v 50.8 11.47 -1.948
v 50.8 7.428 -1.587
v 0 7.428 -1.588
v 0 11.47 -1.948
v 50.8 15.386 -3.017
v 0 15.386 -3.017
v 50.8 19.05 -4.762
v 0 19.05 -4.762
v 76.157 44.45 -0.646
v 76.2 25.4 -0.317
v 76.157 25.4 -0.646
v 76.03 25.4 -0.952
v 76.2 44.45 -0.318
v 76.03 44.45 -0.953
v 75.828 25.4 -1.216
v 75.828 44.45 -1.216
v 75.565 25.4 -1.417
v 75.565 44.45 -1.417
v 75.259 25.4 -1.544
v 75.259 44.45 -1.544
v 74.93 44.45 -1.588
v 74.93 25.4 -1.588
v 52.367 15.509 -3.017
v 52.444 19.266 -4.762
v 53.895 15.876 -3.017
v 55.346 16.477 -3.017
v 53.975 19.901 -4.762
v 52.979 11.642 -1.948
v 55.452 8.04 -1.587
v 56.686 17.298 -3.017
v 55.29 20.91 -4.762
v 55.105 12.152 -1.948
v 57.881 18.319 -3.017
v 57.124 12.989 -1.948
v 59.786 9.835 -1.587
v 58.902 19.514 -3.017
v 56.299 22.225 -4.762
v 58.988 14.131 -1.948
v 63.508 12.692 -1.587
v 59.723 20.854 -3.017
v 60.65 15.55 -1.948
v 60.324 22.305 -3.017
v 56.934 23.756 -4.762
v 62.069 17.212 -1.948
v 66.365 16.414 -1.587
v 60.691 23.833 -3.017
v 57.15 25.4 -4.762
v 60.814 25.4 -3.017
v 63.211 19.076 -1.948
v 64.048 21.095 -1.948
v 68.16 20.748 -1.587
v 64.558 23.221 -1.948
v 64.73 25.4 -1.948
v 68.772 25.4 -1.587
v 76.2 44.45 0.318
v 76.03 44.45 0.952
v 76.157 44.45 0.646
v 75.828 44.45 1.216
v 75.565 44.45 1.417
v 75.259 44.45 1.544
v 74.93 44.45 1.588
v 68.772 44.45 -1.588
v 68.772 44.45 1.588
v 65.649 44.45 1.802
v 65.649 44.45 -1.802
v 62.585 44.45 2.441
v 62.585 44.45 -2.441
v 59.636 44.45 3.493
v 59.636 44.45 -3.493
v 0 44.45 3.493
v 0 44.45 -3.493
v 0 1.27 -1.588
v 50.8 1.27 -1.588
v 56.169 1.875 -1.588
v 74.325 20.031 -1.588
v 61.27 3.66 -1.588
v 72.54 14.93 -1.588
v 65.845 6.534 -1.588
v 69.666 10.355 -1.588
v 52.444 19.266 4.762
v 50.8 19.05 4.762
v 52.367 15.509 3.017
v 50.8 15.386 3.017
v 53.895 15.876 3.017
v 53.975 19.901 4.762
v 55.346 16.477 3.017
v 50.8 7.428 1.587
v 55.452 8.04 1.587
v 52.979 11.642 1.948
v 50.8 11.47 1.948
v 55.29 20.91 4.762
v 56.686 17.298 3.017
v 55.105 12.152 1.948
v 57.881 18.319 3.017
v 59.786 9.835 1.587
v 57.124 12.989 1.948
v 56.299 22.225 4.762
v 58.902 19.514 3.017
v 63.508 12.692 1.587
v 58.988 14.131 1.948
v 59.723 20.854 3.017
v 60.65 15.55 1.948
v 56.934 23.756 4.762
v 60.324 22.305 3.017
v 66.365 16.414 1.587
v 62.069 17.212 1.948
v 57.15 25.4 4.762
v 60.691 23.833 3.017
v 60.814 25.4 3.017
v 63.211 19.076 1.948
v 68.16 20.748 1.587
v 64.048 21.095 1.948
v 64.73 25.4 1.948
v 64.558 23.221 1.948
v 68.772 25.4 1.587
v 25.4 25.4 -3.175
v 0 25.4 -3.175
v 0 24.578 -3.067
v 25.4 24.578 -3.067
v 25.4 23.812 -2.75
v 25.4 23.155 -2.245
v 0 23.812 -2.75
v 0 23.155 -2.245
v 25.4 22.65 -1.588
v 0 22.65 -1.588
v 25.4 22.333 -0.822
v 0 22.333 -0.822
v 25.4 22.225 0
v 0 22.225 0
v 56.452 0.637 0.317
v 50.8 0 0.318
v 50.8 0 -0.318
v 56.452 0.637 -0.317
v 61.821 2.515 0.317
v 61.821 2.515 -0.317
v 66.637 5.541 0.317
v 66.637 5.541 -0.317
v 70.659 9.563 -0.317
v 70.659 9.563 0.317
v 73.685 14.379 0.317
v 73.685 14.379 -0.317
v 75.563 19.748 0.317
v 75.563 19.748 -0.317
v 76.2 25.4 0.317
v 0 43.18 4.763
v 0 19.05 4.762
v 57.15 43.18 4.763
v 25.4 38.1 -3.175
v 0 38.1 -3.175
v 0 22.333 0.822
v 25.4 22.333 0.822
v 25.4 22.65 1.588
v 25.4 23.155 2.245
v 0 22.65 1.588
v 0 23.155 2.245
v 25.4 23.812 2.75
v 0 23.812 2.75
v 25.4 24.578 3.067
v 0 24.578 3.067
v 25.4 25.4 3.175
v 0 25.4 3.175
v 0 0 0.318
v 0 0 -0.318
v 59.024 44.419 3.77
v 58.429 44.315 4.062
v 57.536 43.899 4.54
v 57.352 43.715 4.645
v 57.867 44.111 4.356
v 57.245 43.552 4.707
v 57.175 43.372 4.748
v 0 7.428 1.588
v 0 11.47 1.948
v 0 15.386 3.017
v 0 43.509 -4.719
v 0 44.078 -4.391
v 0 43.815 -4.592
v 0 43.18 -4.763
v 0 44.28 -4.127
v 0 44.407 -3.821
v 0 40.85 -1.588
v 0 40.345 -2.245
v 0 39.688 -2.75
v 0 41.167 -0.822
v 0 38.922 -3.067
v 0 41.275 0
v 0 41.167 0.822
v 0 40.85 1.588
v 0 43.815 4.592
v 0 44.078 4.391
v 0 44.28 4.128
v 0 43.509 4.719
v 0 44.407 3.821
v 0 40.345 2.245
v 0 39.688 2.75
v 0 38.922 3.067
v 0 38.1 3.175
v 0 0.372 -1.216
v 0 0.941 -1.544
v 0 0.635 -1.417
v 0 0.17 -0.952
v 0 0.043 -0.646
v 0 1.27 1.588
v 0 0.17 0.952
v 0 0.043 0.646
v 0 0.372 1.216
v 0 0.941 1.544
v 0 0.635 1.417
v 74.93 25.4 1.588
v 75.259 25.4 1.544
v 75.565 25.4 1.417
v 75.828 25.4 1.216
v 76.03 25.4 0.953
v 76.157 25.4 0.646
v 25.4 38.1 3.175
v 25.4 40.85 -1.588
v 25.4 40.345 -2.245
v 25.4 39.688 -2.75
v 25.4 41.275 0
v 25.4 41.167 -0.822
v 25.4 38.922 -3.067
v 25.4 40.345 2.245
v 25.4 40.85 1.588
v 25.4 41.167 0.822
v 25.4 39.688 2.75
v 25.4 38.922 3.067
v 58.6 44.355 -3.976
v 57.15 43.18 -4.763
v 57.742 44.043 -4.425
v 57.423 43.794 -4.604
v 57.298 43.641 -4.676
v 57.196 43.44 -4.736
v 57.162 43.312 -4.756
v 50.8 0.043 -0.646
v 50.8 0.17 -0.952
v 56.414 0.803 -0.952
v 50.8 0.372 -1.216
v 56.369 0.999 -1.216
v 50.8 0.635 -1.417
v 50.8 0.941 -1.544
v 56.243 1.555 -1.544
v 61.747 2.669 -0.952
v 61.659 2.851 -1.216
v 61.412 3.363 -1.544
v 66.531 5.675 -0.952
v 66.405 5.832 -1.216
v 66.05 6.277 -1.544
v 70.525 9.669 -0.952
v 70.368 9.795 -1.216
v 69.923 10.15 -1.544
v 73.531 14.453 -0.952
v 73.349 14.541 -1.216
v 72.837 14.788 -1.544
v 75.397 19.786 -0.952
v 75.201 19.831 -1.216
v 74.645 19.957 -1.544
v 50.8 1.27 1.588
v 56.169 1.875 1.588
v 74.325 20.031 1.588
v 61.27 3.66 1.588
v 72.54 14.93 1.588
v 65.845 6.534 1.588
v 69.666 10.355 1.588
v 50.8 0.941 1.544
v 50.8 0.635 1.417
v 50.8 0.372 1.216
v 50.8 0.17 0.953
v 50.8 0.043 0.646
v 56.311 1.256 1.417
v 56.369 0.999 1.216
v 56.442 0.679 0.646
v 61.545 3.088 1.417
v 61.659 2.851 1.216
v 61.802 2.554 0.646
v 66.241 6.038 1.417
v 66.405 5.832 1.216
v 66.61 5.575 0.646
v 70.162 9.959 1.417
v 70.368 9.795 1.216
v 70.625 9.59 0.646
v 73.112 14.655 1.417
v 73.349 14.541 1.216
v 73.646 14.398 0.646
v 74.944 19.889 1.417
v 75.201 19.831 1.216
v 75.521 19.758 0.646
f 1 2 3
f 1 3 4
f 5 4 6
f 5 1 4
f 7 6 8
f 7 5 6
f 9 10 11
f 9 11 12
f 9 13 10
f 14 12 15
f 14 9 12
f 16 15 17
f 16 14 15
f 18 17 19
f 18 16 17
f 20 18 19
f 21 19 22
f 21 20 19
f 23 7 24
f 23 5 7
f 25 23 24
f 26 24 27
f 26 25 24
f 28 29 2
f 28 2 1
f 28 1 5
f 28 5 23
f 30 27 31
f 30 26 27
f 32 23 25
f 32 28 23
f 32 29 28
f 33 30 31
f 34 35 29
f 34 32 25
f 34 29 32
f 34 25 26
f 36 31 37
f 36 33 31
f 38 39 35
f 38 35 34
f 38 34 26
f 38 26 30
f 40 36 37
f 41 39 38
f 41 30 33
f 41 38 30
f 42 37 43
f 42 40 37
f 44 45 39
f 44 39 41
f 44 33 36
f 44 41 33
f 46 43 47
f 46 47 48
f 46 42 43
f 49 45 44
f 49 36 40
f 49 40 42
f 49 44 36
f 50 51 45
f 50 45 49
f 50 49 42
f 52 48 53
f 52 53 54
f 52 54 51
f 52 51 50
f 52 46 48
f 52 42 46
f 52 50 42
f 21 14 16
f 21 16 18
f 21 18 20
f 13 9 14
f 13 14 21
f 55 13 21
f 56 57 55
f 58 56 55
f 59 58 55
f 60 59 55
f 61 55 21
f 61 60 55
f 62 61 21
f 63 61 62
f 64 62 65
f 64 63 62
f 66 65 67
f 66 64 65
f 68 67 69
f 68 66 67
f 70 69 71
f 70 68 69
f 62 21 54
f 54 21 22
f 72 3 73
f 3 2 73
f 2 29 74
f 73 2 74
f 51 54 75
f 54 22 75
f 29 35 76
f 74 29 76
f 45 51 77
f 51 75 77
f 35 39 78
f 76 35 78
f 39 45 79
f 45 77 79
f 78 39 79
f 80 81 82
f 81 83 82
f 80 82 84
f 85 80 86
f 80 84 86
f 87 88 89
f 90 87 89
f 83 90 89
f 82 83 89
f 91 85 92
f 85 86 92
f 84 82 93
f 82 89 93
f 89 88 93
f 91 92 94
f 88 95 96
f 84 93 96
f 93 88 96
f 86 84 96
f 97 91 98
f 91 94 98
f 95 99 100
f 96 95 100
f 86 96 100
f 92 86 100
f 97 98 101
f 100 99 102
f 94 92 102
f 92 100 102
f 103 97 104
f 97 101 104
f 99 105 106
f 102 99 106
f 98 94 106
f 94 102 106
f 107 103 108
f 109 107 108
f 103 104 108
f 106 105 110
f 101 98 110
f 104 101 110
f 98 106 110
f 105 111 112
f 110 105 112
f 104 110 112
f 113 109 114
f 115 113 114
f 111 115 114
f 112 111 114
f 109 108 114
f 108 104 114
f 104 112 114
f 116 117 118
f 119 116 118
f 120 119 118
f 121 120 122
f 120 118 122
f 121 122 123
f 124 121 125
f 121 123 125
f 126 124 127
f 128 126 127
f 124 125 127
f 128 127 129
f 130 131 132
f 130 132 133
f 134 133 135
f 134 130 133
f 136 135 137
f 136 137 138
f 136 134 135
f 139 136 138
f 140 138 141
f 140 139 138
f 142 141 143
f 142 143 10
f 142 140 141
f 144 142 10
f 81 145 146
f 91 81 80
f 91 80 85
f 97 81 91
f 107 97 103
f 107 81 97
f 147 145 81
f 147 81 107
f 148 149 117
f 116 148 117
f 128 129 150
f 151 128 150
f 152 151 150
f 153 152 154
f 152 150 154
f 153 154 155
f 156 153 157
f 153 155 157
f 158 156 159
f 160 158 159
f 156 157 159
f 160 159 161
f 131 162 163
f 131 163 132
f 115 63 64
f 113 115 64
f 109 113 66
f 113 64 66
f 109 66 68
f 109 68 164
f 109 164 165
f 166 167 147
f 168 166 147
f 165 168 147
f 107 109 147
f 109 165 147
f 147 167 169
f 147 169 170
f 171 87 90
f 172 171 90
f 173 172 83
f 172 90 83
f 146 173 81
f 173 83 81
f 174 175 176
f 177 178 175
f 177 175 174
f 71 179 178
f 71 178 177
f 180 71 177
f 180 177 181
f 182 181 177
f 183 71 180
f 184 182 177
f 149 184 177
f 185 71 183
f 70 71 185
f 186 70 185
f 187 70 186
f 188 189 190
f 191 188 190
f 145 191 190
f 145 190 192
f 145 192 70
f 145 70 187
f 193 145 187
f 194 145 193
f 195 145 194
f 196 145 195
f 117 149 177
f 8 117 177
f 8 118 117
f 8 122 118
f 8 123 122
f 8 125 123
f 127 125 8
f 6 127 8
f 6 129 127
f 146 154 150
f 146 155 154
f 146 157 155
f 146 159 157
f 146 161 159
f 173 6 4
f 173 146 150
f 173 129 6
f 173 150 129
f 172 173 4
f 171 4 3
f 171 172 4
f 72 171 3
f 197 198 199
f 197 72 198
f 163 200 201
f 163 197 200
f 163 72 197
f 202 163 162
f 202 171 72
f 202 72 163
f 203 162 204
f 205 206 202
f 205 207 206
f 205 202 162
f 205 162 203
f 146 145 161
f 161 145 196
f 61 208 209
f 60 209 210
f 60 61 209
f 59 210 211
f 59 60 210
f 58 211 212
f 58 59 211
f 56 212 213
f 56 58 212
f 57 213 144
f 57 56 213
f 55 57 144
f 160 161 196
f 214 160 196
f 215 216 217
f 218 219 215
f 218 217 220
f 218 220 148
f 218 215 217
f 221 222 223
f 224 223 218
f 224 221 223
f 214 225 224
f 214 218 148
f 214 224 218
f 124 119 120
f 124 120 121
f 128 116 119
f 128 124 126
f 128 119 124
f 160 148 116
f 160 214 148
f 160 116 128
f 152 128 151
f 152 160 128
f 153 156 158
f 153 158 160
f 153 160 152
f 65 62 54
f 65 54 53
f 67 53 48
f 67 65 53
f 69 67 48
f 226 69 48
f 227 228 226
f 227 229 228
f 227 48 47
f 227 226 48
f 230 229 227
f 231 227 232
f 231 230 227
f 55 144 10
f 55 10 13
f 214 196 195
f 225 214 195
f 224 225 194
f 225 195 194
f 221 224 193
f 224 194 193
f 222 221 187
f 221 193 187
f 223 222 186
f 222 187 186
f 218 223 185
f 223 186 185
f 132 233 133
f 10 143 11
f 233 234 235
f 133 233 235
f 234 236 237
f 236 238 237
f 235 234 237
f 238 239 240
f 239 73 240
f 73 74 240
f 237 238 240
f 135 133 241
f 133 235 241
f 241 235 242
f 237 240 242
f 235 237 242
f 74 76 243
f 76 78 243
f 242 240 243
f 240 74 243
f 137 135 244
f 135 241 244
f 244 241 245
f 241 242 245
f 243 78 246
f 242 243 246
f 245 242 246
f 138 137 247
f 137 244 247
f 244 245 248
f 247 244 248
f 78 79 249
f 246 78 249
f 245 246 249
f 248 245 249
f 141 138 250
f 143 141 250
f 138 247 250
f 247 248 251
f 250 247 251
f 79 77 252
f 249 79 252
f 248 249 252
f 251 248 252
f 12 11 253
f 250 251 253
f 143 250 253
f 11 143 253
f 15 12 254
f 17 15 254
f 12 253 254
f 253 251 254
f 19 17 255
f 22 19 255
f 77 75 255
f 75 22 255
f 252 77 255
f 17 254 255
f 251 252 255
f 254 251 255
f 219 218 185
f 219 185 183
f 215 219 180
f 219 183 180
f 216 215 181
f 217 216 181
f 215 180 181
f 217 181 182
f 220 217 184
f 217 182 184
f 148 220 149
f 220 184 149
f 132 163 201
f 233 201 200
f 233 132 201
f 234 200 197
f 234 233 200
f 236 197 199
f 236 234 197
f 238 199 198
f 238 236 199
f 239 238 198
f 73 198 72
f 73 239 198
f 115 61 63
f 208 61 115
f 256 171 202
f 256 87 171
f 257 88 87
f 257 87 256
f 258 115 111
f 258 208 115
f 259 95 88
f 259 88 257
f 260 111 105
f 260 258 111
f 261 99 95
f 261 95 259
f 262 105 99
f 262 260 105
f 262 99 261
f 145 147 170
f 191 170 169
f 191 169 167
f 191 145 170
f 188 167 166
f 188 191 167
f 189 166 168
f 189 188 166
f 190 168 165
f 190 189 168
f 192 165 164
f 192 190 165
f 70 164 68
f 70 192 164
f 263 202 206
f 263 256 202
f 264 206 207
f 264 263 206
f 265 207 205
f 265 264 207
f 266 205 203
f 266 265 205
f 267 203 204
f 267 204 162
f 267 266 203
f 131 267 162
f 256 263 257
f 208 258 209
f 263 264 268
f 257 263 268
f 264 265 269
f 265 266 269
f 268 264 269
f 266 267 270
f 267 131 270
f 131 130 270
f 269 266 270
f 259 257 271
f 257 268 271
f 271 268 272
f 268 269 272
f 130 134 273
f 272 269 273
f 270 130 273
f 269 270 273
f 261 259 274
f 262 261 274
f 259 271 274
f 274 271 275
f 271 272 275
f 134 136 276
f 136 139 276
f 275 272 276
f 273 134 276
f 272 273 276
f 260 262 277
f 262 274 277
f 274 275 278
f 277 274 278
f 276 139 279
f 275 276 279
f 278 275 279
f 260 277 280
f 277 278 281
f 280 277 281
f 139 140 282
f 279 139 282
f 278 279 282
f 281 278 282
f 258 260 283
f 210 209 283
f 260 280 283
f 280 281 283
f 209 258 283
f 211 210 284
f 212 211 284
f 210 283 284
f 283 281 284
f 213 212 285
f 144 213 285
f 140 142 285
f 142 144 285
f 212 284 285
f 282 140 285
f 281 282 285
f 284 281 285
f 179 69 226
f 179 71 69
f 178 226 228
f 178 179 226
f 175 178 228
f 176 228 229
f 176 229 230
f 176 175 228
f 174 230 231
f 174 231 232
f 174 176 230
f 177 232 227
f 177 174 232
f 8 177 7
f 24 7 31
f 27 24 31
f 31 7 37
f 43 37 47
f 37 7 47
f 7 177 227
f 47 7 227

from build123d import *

# Parameters (mm, degrees)
F1_DEPTH = 4.7625
F8_DEPTH = 25.4
F9_R     = 1.27


with BuildPart() as f1:
    # F0 (on Top) → F1 (new body, symmetric)
    with BuildSketch(Plane.XY):
        with BuildLine():
            Line((0, 44.45), (0, 0))
            Line((0, 0), (50.8, 0))
            ThreePointArc((50.8, 0), (68.7605122421, 7.4394877579), (76.2, 25.4))
            Line((76.2, 25.4), (76.2, 44.45))
            Line((76.2, 44.45), (0, 44.45))
        make_face()
    extrude(amount=F1_DEPTH, both=True)


with BuildPart() as f4:
    # F4: sweep along a path in F3
    with BuildLine(Plane.XY.offset(4.7625)) as f4_path:
        Line((0, 0), (50.8, 0))
        ThreePointArc((50.8, 0), (68.7605122421, 7.4394877579), (76.2, 25.4))
        Line((76.2, 25.4), (76.2, 44.45))
    # F2 (on face) → F4 (sweep)
    with BuildSketch(Plane(origin=(0, 0, 0), x_dir=(0, -1, 0), z_dir=(-1, 0, 0))):
        with BuildLine():
            Line((0, 4.7625), (-19.05, 4.7625))
            ThreePointArc((-19.05, 4.7625), (-13.4517306294, 2.3955307002), (-7.4275916867, 1.5875))
            Line((-7.4275916867, 1.5875), (0, 1.5875))
            Line((0, 1.5875), (0, 4.7625))
        make_face()
    sweep(path=f4_path.line)


with BuildPart() as f5_1:
    # F5: instance of F4
    add(f4.part.mirror(Plane.XY))


with BuildPart() as f1_1:
    add(f1.part)

    # F6: cut F4, F5_1
    add(f4.part, mode=Mode.SUBTRACT)
    add(f5_1.part, mode=Mode.SUBTRACT)

    # F7 (on face) → F8 (cut)
    with BuildSketch(Plane(origin=(0, 0, 0), x_dir=(0, -1, 0), z_dir=(-1, 0, 0))):
        with BuildLine():
            Line((-38.1, -3.175), (-25.4, -3.175))
            ThreePointArc((-25.4, -3.175), (-23.1549359697, -2.2450640303), (-22.225, 0))
            ThreePointArc((-22.225, 0), (-23.1549359697, 2.2450640303), (-25.4, 3.175))
            Line((-25.4, 3.175), (-38.1, 3.175))
            ThreePointArc((-38.1, 3.175), (-40.3450640303, 2.2450640303), (-41.275, 0))
            ThreePointArc((-41.275, 0), (-40.3450640303, -2.2450640303), (-38.1, -3.175))
        make_face()
    extrude(amount=-F8_DEPTH, mode=Mode.SUBTRACT)

    # F9
    f9_edges = [f1_1.edges().sort_by_distance(p)[0] for p in [
        (28.575, 44.45, 4.7625),
        (28.575, 44.45, -4.7625),
        (25.4, 0, 1.5875),
        (68.760512, 7.439488, 1.5875),
        (76.2, 34.925, 1.5875),
        (25.4, 0, -1.5875),
        (68.760512, 7.439488, -1.5875),
        (76.2, 34.925, -1.5875),
    ]]
    fillet(f9_edges, radius=F9_R)


solid = f1_1.part
